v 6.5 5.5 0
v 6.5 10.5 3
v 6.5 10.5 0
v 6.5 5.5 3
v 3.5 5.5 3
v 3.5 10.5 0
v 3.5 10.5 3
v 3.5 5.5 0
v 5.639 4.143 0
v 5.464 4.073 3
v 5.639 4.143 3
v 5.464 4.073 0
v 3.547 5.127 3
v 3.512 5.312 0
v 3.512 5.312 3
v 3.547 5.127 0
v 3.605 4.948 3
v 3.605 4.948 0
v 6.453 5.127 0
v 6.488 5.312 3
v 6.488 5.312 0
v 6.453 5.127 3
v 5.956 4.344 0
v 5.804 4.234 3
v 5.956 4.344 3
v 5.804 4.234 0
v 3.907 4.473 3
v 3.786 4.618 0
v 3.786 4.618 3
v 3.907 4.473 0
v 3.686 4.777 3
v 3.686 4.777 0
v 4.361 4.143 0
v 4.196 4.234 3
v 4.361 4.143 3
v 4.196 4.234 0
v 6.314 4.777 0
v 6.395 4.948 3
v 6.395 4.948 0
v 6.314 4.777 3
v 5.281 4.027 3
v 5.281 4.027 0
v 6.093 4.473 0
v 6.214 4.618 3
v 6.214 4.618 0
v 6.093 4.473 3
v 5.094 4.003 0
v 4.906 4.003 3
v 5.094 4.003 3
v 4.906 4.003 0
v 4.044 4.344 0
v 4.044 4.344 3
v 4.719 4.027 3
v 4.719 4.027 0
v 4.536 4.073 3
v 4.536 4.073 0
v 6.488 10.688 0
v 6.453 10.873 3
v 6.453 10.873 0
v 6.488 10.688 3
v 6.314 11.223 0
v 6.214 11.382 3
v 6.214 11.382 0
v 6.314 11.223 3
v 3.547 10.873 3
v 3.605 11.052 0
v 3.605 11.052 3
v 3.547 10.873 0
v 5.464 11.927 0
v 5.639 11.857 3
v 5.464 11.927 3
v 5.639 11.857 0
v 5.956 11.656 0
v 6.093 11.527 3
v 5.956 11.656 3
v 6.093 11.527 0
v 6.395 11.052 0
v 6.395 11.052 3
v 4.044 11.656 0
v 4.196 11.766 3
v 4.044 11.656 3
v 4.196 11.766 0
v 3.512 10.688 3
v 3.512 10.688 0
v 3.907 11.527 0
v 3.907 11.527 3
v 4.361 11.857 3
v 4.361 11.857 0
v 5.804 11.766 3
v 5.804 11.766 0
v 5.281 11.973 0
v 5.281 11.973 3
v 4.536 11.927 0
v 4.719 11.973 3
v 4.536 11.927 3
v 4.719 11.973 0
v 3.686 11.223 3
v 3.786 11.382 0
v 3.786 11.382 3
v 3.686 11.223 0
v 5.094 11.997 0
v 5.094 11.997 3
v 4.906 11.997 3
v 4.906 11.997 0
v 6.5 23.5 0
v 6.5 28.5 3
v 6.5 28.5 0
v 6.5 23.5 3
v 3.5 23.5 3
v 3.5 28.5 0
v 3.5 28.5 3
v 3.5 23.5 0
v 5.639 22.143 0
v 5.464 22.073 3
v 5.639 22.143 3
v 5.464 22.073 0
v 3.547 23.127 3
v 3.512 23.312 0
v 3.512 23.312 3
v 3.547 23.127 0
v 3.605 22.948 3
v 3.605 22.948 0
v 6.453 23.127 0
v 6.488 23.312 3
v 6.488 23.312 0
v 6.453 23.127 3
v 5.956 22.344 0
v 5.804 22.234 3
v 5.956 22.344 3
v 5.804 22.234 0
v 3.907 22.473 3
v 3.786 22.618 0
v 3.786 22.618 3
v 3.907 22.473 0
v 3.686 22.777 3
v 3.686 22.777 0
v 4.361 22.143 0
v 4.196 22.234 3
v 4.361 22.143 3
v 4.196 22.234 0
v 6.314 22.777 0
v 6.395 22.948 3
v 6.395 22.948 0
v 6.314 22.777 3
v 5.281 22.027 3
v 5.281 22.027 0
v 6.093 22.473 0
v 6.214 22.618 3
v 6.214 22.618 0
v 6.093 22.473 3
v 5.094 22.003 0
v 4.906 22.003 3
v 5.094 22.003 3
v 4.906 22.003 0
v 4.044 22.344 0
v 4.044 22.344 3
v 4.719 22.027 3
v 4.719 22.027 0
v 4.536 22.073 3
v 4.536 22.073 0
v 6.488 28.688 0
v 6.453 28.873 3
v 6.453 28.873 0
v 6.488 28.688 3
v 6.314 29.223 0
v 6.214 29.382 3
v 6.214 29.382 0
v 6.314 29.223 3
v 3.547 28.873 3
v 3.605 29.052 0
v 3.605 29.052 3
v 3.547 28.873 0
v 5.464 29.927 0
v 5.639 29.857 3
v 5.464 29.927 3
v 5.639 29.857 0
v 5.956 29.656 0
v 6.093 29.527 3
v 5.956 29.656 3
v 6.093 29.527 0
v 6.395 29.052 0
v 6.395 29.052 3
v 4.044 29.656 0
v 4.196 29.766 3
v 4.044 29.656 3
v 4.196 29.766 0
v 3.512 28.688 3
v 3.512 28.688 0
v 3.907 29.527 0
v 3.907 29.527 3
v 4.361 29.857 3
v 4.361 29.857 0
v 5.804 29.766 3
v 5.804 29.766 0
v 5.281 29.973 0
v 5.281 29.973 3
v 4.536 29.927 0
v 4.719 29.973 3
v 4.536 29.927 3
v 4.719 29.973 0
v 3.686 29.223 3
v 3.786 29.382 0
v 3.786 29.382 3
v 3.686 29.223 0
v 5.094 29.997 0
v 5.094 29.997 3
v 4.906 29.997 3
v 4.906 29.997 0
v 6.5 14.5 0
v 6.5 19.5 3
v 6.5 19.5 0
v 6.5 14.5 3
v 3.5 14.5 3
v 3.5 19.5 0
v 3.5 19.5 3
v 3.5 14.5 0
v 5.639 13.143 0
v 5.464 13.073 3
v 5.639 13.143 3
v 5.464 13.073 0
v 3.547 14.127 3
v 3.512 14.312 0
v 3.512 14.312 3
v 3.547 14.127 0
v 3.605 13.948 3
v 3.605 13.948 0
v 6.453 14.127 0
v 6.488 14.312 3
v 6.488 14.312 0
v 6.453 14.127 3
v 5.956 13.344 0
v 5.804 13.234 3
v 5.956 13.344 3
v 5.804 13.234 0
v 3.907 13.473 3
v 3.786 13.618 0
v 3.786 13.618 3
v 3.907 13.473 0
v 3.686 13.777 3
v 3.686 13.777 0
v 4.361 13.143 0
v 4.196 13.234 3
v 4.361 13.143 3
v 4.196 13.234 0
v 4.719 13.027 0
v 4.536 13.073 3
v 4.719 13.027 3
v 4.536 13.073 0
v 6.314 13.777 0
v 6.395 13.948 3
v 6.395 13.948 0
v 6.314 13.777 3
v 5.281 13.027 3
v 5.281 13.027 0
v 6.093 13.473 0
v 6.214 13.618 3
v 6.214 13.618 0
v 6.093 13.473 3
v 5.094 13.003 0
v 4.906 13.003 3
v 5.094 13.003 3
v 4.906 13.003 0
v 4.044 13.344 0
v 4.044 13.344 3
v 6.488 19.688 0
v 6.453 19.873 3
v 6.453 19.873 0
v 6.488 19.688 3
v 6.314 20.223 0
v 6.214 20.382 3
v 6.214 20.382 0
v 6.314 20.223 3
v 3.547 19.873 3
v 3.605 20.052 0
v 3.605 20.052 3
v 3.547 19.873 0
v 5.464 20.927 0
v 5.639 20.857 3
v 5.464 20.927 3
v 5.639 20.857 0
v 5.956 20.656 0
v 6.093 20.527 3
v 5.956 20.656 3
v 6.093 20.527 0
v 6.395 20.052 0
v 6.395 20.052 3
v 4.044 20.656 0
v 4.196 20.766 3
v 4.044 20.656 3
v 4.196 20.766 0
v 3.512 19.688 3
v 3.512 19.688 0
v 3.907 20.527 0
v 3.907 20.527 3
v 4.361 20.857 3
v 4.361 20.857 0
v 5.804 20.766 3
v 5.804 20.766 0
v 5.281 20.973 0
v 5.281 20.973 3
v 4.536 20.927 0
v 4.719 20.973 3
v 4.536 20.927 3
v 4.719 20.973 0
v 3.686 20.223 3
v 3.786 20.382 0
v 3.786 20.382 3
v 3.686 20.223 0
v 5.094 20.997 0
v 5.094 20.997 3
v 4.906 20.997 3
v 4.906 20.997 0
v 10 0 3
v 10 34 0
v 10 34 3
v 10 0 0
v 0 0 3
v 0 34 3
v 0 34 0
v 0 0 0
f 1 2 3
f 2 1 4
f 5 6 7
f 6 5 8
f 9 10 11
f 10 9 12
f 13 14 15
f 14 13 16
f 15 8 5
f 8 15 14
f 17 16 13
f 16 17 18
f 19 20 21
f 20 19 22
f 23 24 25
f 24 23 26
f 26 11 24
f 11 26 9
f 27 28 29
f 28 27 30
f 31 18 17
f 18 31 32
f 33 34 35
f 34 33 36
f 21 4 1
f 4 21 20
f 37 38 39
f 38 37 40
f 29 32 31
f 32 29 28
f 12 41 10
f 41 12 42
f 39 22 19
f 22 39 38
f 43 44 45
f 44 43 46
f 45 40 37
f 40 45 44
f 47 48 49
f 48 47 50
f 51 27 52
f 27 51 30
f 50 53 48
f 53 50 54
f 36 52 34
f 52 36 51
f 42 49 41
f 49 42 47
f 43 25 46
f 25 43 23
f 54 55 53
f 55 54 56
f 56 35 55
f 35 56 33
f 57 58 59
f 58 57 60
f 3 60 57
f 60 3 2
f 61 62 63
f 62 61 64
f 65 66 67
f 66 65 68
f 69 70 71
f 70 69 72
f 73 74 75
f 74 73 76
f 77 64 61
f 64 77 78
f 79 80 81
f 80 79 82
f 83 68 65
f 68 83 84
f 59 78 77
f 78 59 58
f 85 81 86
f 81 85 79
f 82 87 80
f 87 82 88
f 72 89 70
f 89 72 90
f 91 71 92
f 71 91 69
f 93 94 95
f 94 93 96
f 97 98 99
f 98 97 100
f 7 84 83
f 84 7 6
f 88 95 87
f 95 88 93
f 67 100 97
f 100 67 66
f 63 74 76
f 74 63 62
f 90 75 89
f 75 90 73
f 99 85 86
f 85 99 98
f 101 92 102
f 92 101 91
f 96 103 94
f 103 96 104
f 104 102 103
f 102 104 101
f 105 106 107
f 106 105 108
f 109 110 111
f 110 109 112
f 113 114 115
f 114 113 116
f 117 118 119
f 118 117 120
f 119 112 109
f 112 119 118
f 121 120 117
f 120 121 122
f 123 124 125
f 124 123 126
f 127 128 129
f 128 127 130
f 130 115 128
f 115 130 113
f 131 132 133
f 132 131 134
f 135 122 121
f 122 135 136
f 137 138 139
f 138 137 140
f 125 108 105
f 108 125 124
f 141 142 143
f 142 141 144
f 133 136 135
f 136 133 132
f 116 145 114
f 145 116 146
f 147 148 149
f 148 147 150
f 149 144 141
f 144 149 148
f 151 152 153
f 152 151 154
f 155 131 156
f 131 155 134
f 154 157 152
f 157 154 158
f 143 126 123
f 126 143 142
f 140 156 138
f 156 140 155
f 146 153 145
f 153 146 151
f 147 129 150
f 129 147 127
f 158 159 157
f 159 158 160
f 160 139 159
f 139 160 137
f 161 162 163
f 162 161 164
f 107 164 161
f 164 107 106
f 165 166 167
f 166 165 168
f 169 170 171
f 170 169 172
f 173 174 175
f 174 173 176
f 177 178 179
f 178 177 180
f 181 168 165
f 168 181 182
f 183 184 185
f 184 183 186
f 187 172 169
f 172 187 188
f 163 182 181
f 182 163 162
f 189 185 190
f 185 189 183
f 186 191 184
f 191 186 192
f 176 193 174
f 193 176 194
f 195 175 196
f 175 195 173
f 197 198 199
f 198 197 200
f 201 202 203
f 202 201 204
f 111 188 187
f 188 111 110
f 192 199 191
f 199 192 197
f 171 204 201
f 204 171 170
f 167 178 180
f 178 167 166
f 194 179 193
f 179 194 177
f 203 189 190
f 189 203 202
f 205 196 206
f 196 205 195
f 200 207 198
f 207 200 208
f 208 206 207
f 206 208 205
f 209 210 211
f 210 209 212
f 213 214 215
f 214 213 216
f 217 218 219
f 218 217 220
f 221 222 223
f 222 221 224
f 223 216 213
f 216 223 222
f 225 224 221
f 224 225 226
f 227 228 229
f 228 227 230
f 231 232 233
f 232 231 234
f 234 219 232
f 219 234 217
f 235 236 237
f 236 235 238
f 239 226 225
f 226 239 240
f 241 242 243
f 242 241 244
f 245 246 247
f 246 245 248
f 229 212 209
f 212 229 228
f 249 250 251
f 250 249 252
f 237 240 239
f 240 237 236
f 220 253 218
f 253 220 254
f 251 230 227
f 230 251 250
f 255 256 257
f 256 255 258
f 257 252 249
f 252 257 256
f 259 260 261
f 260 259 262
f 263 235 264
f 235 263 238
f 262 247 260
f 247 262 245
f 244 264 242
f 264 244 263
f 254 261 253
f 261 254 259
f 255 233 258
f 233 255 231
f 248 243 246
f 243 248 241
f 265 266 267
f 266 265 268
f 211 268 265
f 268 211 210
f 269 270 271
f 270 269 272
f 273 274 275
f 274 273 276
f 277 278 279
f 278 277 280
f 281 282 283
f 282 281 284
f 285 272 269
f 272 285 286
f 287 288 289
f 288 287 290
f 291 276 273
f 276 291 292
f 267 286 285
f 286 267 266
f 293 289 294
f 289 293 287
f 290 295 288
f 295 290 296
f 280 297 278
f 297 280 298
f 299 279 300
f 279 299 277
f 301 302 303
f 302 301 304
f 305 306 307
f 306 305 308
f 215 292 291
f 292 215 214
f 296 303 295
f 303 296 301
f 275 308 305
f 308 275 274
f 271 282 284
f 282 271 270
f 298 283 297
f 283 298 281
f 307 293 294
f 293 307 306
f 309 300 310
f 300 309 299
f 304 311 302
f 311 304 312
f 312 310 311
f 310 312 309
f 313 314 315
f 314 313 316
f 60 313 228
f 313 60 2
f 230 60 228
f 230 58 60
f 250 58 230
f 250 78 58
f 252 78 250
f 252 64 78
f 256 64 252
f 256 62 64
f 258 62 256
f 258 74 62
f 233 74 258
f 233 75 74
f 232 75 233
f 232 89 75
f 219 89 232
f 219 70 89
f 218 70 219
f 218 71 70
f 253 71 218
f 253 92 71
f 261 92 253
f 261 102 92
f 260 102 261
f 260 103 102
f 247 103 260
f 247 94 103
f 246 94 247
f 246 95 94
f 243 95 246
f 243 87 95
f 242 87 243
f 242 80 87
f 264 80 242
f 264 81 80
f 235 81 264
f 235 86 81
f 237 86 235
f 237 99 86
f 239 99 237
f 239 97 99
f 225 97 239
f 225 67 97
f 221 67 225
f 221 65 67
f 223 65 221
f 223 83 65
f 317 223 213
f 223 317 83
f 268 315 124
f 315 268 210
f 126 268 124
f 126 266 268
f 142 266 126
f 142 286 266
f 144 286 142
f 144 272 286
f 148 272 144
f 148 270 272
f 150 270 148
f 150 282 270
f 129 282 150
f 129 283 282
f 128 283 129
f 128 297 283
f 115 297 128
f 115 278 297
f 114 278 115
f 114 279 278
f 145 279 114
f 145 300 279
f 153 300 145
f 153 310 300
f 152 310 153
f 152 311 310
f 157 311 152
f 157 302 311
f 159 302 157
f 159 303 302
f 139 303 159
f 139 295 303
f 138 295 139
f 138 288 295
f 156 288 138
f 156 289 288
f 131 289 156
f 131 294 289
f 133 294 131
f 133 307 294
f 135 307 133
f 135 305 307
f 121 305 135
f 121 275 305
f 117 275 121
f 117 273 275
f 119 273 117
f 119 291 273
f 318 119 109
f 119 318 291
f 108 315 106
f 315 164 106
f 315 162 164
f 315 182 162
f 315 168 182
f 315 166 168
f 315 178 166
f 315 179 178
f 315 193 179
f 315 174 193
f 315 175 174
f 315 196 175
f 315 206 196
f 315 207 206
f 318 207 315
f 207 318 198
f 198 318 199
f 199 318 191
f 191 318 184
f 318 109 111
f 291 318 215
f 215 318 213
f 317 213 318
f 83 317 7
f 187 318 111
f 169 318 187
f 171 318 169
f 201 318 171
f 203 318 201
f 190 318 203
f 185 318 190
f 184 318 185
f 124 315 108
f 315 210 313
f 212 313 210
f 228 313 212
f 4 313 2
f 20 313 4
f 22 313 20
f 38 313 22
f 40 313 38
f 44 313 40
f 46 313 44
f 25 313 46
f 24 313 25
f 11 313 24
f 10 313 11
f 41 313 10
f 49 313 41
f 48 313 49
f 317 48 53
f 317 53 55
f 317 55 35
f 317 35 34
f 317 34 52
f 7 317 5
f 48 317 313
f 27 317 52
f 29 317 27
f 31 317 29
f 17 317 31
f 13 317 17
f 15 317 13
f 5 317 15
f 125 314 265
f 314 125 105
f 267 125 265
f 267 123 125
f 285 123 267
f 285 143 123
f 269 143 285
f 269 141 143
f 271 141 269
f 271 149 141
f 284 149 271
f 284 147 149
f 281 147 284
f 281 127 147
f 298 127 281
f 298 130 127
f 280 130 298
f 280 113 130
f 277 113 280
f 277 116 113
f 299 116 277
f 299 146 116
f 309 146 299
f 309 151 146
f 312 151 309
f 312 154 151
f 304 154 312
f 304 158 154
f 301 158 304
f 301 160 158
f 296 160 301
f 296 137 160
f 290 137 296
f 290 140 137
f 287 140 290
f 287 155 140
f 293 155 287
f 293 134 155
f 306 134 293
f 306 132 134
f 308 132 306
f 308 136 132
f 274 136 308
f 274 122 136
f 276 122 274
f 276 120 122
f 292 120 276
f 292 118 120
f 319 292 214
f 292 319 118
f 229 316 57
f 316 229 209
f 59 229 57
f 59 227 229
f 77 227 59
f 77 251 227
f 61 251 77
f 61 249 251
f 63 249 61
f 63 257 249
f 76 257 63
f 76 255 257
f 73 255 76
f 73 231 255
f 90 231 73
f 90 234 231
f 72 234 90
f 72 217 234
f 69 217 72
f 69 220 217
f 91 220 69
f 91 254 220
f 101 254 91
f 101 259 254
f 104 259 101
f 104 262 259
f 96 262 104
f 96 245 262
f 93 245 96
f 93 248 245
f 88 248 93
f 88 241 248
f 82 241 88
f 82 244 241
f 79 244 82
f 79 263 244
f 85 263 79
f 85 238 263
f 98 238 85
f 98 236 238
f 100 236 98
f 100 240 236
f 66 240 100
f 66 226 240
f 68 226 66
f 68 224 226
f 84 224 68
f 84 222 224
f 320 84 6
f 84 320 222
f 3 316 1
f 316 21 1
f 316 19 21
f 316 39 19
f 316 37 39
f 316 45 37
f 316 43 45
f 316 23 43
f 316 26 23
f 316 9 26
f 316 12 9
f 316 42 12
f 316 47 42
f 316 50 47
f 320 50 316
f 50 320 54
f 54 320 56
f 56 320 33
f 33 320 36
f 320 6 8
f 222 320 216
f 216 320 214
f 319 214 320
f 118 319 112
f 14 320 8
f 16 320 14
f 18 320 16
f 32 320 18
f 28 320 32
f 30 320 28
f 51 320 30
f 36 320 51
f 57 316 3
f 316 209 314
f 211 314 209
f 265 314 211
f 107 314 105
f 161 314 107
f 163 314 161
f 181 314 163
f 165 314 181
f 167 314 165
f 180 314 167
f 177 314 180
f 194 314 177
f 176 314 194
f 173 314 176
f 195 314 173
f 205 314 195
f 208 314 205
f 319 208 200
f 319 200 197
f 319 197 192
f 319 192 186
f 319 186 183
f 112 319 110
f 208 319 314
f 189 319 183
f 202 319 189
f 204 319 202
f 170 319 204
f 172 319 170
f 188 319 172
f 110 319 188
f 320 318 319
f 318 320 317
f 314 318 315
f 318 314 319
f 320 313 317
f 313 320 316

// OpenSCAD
module otverstie(y) {
    translate ([5,y,1,])
        cube([3,5,5], center=true);
    translate ([5,y-2.5,-1])
        cylinder(r=1.5,h=5,$fn=50);
    translate ([5,y+2.5,-1])
        cylinder(r=1.5,h=5,$fn=50);
}
difference (){
    cube([10,34,3]);
    otverstie(8);
    otverstie(26);
    otverstie(17);
}
